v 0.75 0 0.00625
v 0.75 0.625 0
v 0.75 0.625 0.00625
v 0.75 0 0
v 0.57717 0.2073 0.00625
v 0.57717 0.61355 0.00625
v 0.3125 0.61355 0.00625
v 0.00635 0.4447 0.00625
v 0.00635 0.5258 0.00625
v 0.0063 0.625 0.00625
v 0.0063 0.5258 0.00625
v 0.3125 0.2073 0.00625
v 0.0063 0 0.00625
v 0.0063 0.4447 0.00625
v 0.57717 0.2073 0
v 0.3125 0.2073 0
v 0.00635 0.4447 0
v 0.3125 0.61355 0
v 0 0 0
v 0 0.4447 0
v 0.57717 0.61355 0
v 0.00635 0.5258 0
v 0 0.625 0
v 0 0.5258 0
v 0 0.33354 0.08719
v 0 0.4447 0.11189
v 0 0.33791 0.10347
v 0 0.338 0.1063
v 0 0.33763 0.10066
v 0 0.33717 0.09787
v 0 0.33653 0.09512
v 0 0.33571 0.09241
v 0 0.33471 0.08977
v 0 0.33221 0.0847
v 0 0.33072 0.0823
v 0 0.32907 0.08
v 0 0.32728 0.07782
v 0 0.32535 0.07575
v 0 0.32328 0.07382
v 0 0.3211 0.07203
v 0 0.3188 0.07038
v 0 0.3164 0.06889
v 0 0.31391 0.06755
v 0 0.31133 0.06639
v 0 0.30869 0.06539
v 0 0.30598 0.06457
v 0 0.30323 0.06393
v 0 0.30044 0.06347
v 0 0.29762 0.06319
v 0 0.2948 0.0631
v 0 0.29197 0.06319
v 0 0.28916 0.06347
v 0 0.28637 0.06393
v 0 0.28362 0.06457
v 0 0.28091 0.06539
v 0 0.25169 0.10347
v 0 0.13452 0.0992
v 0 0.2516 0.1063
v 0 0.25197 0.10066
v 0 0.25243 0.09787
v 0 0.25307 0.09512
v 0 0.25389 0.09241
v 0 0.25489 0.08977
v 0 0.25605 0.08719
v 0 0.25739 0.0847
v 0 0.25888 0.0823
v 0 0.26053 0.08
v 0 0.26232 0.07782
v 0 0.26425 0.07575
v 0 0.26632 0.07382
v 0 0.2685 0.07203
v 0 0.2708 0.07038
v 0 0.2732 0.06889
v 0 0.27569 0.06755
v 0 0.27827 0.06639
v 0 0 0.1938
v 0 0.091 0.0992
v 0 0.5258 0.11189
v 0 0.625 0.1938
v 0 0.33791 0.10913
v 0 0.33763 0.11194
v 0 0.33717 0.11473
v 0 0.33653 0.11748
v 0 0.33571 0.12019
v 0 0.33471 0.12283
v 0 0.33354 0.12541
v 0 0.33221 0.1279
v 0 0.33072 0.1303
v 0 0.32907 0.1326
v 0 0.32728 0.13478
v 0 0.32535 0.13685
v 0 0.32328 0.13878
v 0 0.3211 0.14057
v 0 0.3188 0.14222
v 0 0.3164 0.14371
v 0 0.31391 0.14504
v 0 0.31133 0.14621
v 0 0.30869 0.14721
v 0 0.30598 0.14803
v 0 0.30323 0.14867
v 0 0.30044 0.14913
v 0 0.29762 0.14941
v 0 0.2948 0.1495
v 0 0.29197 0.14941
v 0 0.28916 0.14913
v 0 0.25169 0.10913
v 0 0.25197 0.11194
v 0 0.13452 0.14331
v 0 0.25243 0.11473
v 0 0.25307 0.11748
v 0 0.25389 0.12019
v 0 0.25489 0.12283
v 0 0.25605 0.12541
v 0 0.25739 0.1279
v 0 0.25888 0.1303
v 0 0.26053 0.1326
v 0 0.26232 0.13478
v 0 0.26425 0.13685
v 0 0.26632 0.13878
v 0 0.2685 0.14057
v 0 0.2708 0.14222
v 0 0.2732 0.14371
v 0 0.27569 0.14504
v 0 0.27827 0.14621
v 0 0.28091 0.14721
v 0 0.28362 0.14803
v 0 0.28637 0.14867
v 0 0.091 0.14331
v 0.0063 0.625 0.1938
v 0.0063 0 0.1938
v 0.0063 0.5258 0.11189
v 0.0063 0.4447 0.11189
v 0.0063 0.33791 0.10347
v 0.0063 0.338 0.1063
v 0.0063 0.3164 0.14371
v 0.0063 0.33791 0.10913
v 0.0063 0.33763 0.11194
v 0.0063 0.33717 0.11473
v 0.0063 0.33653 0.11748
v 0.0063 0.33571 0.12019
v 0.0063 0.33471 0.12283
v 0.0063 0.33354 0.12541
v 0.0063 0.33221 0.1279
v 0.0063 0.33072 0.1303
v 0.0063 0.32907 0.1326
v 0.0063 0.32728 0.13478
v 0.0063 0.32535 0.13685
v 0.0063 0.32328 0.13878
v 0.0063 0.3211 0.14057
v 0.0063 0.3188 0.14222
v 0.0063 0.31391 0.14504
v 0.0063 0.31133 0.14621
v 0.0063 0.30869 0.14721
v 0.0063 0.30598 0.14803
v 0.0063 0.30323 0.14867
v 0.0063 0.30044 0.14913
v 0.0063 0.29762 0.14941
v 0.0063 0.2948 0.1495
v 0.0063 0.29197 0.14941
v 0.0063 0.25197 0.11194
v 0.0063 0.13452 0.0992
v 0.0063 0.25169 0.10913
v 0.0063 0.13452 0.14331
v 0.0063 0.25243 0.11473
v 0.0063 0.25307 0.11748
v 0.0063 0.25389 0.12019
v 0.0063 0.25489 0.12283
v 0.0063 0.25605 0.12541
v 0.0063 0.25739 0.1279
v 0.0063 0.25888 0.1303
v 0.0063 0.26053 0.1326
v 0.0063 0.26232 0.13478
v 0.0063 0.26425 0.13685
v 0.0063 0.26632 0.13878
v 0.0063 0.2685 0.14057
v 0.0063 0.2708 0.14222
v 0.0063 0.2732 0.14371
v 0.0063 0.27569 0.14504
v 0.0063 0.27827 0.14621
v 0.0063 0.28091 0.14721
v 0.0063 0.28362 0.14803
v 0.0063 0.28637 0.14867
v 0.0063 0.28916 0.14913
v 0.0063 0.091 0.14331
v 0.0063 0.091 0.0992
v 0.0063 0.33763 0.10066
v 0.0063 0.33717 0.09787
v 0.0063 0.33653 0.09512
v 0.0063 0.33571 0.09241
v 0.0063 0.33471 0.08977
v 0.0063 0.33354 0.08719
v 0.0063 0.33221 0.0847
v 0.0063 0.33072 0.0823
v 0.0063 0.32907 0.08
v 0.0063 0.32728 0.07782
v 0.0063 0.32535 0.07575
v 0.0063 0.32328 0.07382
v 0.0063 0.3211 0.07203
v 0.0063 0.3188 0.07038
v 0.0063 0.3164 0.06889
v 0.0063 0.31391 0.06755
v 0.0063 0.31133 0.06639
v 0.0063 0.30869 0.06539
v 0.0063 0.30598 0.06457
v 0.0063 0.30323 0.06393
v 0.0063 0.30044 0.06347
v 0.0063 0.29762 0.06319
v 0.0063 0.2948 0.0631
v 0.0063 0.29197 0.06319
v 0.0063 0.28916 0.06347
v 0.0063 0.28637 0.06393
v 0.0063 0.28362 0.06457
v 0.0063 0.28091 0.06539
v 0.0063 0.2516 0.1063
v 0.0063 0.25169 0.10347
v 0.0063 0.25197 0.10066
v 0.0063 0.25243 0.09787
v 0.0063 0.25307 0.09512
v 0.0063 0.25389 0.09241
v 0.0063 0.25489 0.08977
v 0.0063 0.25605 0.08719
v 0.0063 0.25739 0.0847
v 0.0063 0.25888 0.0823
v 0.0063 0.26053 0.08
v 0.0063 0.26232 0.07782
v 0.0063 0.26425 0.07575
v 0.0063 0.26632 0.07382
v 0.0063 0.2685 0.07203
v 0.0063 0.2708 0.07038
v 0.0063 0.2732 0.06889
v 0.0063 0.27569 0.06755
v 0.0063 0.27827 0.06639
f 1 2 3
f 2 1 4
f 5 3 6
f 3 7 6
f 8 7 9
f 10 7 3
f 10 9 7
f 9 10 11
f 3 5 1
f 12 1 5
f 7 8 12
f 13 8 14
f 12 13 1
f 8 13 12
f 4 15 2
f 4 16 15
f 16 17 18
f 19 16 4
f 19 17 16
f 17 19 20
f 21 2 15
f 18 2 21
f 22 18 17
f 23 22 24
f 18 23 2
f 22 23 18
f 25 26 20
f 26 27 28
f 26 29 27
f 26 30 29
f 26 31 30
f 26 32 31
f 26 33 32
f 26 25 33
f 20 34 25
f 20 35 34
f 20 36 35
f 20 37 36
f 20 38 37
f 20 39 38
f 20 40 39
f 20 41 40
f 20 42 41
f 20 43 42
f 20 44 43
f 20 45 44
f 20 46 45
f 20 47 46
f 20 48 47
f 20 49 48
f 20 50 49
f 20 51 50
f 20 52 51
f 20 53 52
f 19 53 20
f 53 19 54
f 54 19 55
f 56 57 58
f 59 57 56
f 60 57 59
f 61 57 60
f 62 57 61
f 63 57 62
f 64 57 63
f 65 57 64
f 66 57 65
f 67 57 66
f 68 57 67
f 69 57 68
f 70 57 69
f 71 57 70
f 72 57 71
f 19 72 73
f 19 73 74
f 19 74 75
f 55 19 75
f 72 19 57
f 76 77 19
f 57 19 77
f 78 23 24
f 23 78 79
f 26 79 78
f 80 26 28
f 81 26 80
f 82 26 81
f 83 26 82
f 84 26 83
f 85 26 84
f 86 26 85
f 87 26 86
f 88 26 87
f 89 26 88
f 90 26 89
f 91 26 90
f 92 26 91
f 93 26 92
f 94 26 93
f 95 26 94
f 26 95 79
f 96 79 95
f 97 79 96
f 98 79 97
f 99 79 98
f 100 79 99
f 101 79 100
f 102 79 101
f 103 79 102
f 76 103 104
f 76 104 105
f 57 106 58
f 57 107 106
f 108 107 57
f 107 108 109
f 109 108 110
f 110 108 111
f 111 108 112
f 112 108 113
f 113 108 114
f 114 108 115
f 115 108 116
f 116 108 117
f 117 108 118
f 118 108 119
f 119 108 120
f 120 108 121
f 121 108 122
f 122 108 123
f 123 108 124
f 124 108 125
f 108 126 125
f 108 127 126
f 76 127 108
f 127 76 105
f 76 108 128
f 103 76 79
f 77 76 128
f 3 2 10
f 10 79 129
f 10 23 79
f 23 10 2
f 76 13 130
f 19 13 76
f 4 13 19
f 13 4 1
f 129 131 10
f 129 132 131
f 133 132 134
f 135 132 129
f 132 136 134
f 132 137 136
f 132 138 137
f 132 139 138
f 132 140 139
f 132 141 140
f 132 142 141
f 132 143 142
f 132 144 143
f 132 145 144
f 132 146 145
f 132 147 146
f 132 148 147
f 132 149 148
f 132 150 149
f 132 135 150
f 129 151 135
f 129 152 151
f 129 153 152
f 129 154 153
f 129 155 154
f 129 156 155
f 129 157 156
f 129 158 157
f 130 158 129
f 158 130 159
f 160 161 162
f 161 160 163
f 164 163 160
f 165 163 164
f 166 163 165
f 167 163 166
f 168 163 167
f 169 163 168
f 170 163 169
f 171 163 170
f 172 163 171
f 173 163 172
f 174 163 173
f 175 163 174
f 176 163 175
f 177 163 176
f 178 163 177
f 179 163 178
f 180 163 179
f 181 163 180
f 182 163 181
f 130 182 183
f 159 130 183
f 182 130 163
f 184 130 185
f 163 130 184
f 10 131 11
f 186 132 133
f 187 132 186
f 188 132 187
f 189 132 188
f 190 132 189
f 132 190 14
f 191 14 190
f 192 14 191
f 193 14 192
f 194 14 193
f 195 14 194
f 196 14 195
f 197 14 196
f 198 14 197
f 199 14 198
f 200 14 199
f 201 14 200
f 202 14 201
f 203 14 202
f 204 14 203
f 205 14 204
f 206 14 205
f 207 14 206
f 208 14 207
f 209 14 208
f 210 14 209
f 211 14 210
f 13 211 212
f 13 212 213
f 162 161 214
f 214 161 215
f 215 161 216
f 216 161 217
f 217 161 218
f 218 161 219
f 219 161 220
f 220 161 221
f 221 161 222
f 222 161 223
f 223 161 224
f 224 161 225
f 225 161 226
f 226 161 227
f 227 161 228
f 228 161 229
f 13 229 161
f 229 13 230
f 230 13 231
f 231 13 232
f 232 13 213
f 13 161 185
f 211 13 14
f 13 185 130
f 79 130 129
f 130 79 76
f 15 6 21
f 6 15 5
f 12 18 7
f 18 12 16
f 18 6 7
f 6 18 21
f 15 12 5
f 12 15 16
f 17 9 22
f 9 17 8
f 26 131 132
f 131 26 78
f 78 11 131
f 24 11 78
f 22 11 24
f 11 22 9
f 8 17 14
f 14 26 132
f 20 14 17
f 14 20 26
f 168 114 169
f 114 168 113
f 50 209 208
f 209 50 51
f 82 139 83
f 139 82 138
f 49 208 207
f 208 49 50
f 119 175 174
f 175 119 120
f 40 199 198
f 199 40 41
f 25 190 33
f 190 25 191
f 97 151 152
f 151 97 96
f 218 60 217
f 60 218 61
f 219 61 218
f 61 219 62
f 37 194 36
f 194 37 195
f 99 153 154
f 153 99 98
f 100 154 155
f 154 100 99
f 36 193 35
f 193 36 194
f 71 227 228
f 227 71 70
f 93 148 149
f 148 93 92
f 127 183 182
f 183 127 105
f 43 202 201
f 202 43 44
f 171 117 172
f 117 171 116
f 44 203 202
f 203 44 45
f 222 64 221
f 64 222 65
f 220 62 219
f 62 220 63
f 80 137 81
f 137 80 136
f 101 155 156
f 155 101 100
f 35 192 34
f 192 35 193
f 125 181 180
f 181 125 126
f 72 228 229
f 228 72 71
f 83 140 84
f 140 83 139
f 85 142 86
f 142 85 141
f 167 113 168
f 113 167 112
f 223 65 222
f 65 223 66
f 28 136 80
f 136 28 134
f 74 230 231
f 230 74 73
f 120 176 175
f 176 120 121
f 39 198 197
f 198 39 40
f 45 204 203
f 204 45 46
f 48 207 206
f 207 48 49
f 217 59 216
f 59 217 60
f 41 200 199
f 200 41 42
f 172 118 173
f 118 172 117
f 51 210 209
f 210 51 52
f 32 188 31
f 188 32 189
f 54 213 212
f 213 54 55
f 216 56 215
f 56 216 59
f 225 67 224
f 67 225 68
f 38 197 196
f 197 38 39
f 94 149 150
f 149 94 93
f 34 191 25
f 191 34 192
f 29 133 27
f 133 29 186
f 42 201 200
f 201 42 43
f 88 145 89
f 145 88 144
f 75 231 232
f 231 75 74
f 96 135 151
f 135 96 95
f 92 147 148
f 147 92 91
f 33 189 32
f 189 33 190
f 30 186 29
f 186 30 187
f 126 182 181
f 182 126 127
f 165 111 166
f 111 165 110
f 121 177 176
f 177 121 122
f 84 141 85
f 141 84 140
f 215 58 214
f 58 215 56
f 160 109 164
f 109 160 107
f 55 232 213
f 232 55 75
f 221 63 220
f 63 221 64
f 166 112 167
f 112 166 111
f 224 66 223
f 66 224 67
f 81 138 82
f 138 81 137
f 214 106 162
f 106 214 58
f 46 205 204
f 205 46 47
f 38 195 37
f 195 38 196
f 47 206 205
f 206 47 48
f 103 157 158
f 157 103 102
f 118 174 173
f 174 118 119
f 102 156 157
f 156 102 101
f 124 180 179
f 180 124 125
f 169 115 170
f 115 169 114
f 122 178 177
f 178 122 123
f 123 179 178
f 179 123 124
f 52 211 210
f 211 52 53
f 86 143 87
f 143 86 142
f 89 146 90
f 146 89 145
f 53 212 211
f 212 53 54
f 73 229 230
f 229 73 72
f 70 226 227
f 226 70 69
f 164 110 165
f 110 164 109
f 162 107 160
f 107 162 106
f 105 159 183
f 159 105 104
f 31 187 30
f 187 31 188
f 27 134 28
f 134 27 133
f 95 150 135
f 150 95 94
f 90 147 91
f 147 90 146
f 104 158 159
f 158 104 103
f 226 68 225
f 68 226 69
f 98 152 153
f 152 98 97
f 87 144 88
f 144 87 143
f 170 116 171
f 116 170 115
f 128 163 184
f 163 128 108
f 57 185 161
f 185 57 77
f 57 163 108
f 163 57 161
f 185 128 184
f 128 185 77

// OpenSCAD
// Parameters
$fn = 96;
clearance = 0.00005;

// Datum: left-front-bottom of base; X=length, Y=width, Z=up.

// Main base
base_length = 0.75;
base_width = 0.625;
base_height = 0.00625;
base_upward_reach_reference = 0.0062;

// Left upright wall
wall_left_offset = 0;
wall_right_offset = 0.7437;
wall_thickness = 0.0063;
wall_depth = base_width;
wall_total_height = 0.1938;
wall_rise_above_plate = 0.1875;

// Lower wall opening
lower_open_length = 0.081103;
lower_open_height = 0.111891;
lower_open_front_offset = 0.4447;
lower_open_back_offset = 0.0992;
lower_open_z_min = 0;
lower_open_cut_reach = 0.0062;

// Circular wall through-hole
circle_hole_radius = 0.0432;
circle_hole_center_y = 0.2948;
circle_hole_z_min = 0.0631;
circle_hole_z_max = 0.1495;
circle_hole_cut_reach = 0.0625;

// Upper wall opening
upper_open_length = 0.043521;
upper_open_height = 0.044108;
upper_open_front_offset = 0.091;
upper_open_back_offset = 0.4905;
upper_open_z_min = 0.0992;
upper_open_z_max_reference = 0.1433;
upper_open_cut_reach = 0.0625;

// Base through opening
base_open_length = 0.264669;
base_open_width = 0.40625;
base_open_left_offset = 0.3125;
base_open_right_offset = 0.1728;
base_open_front_offset = 0.2073;
base_open_back_offset = 0.0115;
base_open_z_min = -0.0562;
base_open_z_max = 0.0063;

// Derived positions
wall_x0 = wall_left_offset;
wall_y0 = 0;
wall_z0 = 0;
circle_hole_center_z = (circle_hole_z_min + circle_hole_z_max) / 2;

// Basic box module
module box_at(x0, y0, z0, sx, sy, sz) {
    translate([x0, y0, z0])
        cube([sx, sy, sz], center=false);
}

// Thin rectangular base
module base_plate() {
    box_at(0, 0, 0, base_length, base_width, base_height);
}

// Solid wall strip along left edge
module left_upright_wall() {
    box_at(wall_x0, wall_y0, wall_z0, wall_thickness, wall_depth, wall_total_height);
}

// Rectangular cut normal to wall
module wall_rect_cut(y0, y_len, z0, z_len, cut_reach) {
    z_bottom_clearance = (z0 <= 0) ? clearance : 0;
    through_depth = max(cut_reach, wall_thickness) + 2 * clearance;

    box_at(
        wall_x0 - clearance,
        y0,
        z0 - z_bottom_clearance,
        through_depth,
        y_len,
        z_len + z_bottom_clearance
    );
}

// Circular cut normal to wall
module wall_round_cut(yc, zc, radius, cut_reach) {
    through_depth = max(cut_reach, wall_thickness) + 2 * clearance;

    translate([wall_x0 - clearance, yc, zc])
        rotate([0, 90, 0])
            cylinder(h=through_depth, r=radius, center=false);
}

// Base rectangular through cut
module base_rect_cut() {
    box_at(
        base_open_left_offset,
        base_open_front_offset,
        base_open_z_min,
        base_open_length,
        base_open_width,
        base_open_z_max - base_open_z_min
    );
}

// Lower rectangular wall opening
module lower_wall_opening_cut() {
    wall_rect_cut(
        lower_open_front_offset,
        lower_open_length,
        lower_open_z_min,
        lower_open_height,
        lower_open_cut_reach
    );
}

// Circular wall hole
module circular_wall_hole_cut() {
    wall_round_cut(
        circle_hole_center_y,
        circle_hole_center_z,
        circle_hole_radius,
        circle_hole_cut_reach
    );
}

// Upper rectangular wall opening
module upper_wall_opening_cut() {
    wall_rect_cut(
        upper_open_front_offset,
        upper_open_length,
        upper_open_z_min,
        upper_open_height,
        upper_open_cut_reach
    );
}

// Main model
difference() {
    union() {
        base_plate();
        left_upright_wall();
    }

    base_rect_cut();
    lower_wall_opening_cut();
    circular_wall_hole_cut();
    upper_wall_opening_cut();
}
